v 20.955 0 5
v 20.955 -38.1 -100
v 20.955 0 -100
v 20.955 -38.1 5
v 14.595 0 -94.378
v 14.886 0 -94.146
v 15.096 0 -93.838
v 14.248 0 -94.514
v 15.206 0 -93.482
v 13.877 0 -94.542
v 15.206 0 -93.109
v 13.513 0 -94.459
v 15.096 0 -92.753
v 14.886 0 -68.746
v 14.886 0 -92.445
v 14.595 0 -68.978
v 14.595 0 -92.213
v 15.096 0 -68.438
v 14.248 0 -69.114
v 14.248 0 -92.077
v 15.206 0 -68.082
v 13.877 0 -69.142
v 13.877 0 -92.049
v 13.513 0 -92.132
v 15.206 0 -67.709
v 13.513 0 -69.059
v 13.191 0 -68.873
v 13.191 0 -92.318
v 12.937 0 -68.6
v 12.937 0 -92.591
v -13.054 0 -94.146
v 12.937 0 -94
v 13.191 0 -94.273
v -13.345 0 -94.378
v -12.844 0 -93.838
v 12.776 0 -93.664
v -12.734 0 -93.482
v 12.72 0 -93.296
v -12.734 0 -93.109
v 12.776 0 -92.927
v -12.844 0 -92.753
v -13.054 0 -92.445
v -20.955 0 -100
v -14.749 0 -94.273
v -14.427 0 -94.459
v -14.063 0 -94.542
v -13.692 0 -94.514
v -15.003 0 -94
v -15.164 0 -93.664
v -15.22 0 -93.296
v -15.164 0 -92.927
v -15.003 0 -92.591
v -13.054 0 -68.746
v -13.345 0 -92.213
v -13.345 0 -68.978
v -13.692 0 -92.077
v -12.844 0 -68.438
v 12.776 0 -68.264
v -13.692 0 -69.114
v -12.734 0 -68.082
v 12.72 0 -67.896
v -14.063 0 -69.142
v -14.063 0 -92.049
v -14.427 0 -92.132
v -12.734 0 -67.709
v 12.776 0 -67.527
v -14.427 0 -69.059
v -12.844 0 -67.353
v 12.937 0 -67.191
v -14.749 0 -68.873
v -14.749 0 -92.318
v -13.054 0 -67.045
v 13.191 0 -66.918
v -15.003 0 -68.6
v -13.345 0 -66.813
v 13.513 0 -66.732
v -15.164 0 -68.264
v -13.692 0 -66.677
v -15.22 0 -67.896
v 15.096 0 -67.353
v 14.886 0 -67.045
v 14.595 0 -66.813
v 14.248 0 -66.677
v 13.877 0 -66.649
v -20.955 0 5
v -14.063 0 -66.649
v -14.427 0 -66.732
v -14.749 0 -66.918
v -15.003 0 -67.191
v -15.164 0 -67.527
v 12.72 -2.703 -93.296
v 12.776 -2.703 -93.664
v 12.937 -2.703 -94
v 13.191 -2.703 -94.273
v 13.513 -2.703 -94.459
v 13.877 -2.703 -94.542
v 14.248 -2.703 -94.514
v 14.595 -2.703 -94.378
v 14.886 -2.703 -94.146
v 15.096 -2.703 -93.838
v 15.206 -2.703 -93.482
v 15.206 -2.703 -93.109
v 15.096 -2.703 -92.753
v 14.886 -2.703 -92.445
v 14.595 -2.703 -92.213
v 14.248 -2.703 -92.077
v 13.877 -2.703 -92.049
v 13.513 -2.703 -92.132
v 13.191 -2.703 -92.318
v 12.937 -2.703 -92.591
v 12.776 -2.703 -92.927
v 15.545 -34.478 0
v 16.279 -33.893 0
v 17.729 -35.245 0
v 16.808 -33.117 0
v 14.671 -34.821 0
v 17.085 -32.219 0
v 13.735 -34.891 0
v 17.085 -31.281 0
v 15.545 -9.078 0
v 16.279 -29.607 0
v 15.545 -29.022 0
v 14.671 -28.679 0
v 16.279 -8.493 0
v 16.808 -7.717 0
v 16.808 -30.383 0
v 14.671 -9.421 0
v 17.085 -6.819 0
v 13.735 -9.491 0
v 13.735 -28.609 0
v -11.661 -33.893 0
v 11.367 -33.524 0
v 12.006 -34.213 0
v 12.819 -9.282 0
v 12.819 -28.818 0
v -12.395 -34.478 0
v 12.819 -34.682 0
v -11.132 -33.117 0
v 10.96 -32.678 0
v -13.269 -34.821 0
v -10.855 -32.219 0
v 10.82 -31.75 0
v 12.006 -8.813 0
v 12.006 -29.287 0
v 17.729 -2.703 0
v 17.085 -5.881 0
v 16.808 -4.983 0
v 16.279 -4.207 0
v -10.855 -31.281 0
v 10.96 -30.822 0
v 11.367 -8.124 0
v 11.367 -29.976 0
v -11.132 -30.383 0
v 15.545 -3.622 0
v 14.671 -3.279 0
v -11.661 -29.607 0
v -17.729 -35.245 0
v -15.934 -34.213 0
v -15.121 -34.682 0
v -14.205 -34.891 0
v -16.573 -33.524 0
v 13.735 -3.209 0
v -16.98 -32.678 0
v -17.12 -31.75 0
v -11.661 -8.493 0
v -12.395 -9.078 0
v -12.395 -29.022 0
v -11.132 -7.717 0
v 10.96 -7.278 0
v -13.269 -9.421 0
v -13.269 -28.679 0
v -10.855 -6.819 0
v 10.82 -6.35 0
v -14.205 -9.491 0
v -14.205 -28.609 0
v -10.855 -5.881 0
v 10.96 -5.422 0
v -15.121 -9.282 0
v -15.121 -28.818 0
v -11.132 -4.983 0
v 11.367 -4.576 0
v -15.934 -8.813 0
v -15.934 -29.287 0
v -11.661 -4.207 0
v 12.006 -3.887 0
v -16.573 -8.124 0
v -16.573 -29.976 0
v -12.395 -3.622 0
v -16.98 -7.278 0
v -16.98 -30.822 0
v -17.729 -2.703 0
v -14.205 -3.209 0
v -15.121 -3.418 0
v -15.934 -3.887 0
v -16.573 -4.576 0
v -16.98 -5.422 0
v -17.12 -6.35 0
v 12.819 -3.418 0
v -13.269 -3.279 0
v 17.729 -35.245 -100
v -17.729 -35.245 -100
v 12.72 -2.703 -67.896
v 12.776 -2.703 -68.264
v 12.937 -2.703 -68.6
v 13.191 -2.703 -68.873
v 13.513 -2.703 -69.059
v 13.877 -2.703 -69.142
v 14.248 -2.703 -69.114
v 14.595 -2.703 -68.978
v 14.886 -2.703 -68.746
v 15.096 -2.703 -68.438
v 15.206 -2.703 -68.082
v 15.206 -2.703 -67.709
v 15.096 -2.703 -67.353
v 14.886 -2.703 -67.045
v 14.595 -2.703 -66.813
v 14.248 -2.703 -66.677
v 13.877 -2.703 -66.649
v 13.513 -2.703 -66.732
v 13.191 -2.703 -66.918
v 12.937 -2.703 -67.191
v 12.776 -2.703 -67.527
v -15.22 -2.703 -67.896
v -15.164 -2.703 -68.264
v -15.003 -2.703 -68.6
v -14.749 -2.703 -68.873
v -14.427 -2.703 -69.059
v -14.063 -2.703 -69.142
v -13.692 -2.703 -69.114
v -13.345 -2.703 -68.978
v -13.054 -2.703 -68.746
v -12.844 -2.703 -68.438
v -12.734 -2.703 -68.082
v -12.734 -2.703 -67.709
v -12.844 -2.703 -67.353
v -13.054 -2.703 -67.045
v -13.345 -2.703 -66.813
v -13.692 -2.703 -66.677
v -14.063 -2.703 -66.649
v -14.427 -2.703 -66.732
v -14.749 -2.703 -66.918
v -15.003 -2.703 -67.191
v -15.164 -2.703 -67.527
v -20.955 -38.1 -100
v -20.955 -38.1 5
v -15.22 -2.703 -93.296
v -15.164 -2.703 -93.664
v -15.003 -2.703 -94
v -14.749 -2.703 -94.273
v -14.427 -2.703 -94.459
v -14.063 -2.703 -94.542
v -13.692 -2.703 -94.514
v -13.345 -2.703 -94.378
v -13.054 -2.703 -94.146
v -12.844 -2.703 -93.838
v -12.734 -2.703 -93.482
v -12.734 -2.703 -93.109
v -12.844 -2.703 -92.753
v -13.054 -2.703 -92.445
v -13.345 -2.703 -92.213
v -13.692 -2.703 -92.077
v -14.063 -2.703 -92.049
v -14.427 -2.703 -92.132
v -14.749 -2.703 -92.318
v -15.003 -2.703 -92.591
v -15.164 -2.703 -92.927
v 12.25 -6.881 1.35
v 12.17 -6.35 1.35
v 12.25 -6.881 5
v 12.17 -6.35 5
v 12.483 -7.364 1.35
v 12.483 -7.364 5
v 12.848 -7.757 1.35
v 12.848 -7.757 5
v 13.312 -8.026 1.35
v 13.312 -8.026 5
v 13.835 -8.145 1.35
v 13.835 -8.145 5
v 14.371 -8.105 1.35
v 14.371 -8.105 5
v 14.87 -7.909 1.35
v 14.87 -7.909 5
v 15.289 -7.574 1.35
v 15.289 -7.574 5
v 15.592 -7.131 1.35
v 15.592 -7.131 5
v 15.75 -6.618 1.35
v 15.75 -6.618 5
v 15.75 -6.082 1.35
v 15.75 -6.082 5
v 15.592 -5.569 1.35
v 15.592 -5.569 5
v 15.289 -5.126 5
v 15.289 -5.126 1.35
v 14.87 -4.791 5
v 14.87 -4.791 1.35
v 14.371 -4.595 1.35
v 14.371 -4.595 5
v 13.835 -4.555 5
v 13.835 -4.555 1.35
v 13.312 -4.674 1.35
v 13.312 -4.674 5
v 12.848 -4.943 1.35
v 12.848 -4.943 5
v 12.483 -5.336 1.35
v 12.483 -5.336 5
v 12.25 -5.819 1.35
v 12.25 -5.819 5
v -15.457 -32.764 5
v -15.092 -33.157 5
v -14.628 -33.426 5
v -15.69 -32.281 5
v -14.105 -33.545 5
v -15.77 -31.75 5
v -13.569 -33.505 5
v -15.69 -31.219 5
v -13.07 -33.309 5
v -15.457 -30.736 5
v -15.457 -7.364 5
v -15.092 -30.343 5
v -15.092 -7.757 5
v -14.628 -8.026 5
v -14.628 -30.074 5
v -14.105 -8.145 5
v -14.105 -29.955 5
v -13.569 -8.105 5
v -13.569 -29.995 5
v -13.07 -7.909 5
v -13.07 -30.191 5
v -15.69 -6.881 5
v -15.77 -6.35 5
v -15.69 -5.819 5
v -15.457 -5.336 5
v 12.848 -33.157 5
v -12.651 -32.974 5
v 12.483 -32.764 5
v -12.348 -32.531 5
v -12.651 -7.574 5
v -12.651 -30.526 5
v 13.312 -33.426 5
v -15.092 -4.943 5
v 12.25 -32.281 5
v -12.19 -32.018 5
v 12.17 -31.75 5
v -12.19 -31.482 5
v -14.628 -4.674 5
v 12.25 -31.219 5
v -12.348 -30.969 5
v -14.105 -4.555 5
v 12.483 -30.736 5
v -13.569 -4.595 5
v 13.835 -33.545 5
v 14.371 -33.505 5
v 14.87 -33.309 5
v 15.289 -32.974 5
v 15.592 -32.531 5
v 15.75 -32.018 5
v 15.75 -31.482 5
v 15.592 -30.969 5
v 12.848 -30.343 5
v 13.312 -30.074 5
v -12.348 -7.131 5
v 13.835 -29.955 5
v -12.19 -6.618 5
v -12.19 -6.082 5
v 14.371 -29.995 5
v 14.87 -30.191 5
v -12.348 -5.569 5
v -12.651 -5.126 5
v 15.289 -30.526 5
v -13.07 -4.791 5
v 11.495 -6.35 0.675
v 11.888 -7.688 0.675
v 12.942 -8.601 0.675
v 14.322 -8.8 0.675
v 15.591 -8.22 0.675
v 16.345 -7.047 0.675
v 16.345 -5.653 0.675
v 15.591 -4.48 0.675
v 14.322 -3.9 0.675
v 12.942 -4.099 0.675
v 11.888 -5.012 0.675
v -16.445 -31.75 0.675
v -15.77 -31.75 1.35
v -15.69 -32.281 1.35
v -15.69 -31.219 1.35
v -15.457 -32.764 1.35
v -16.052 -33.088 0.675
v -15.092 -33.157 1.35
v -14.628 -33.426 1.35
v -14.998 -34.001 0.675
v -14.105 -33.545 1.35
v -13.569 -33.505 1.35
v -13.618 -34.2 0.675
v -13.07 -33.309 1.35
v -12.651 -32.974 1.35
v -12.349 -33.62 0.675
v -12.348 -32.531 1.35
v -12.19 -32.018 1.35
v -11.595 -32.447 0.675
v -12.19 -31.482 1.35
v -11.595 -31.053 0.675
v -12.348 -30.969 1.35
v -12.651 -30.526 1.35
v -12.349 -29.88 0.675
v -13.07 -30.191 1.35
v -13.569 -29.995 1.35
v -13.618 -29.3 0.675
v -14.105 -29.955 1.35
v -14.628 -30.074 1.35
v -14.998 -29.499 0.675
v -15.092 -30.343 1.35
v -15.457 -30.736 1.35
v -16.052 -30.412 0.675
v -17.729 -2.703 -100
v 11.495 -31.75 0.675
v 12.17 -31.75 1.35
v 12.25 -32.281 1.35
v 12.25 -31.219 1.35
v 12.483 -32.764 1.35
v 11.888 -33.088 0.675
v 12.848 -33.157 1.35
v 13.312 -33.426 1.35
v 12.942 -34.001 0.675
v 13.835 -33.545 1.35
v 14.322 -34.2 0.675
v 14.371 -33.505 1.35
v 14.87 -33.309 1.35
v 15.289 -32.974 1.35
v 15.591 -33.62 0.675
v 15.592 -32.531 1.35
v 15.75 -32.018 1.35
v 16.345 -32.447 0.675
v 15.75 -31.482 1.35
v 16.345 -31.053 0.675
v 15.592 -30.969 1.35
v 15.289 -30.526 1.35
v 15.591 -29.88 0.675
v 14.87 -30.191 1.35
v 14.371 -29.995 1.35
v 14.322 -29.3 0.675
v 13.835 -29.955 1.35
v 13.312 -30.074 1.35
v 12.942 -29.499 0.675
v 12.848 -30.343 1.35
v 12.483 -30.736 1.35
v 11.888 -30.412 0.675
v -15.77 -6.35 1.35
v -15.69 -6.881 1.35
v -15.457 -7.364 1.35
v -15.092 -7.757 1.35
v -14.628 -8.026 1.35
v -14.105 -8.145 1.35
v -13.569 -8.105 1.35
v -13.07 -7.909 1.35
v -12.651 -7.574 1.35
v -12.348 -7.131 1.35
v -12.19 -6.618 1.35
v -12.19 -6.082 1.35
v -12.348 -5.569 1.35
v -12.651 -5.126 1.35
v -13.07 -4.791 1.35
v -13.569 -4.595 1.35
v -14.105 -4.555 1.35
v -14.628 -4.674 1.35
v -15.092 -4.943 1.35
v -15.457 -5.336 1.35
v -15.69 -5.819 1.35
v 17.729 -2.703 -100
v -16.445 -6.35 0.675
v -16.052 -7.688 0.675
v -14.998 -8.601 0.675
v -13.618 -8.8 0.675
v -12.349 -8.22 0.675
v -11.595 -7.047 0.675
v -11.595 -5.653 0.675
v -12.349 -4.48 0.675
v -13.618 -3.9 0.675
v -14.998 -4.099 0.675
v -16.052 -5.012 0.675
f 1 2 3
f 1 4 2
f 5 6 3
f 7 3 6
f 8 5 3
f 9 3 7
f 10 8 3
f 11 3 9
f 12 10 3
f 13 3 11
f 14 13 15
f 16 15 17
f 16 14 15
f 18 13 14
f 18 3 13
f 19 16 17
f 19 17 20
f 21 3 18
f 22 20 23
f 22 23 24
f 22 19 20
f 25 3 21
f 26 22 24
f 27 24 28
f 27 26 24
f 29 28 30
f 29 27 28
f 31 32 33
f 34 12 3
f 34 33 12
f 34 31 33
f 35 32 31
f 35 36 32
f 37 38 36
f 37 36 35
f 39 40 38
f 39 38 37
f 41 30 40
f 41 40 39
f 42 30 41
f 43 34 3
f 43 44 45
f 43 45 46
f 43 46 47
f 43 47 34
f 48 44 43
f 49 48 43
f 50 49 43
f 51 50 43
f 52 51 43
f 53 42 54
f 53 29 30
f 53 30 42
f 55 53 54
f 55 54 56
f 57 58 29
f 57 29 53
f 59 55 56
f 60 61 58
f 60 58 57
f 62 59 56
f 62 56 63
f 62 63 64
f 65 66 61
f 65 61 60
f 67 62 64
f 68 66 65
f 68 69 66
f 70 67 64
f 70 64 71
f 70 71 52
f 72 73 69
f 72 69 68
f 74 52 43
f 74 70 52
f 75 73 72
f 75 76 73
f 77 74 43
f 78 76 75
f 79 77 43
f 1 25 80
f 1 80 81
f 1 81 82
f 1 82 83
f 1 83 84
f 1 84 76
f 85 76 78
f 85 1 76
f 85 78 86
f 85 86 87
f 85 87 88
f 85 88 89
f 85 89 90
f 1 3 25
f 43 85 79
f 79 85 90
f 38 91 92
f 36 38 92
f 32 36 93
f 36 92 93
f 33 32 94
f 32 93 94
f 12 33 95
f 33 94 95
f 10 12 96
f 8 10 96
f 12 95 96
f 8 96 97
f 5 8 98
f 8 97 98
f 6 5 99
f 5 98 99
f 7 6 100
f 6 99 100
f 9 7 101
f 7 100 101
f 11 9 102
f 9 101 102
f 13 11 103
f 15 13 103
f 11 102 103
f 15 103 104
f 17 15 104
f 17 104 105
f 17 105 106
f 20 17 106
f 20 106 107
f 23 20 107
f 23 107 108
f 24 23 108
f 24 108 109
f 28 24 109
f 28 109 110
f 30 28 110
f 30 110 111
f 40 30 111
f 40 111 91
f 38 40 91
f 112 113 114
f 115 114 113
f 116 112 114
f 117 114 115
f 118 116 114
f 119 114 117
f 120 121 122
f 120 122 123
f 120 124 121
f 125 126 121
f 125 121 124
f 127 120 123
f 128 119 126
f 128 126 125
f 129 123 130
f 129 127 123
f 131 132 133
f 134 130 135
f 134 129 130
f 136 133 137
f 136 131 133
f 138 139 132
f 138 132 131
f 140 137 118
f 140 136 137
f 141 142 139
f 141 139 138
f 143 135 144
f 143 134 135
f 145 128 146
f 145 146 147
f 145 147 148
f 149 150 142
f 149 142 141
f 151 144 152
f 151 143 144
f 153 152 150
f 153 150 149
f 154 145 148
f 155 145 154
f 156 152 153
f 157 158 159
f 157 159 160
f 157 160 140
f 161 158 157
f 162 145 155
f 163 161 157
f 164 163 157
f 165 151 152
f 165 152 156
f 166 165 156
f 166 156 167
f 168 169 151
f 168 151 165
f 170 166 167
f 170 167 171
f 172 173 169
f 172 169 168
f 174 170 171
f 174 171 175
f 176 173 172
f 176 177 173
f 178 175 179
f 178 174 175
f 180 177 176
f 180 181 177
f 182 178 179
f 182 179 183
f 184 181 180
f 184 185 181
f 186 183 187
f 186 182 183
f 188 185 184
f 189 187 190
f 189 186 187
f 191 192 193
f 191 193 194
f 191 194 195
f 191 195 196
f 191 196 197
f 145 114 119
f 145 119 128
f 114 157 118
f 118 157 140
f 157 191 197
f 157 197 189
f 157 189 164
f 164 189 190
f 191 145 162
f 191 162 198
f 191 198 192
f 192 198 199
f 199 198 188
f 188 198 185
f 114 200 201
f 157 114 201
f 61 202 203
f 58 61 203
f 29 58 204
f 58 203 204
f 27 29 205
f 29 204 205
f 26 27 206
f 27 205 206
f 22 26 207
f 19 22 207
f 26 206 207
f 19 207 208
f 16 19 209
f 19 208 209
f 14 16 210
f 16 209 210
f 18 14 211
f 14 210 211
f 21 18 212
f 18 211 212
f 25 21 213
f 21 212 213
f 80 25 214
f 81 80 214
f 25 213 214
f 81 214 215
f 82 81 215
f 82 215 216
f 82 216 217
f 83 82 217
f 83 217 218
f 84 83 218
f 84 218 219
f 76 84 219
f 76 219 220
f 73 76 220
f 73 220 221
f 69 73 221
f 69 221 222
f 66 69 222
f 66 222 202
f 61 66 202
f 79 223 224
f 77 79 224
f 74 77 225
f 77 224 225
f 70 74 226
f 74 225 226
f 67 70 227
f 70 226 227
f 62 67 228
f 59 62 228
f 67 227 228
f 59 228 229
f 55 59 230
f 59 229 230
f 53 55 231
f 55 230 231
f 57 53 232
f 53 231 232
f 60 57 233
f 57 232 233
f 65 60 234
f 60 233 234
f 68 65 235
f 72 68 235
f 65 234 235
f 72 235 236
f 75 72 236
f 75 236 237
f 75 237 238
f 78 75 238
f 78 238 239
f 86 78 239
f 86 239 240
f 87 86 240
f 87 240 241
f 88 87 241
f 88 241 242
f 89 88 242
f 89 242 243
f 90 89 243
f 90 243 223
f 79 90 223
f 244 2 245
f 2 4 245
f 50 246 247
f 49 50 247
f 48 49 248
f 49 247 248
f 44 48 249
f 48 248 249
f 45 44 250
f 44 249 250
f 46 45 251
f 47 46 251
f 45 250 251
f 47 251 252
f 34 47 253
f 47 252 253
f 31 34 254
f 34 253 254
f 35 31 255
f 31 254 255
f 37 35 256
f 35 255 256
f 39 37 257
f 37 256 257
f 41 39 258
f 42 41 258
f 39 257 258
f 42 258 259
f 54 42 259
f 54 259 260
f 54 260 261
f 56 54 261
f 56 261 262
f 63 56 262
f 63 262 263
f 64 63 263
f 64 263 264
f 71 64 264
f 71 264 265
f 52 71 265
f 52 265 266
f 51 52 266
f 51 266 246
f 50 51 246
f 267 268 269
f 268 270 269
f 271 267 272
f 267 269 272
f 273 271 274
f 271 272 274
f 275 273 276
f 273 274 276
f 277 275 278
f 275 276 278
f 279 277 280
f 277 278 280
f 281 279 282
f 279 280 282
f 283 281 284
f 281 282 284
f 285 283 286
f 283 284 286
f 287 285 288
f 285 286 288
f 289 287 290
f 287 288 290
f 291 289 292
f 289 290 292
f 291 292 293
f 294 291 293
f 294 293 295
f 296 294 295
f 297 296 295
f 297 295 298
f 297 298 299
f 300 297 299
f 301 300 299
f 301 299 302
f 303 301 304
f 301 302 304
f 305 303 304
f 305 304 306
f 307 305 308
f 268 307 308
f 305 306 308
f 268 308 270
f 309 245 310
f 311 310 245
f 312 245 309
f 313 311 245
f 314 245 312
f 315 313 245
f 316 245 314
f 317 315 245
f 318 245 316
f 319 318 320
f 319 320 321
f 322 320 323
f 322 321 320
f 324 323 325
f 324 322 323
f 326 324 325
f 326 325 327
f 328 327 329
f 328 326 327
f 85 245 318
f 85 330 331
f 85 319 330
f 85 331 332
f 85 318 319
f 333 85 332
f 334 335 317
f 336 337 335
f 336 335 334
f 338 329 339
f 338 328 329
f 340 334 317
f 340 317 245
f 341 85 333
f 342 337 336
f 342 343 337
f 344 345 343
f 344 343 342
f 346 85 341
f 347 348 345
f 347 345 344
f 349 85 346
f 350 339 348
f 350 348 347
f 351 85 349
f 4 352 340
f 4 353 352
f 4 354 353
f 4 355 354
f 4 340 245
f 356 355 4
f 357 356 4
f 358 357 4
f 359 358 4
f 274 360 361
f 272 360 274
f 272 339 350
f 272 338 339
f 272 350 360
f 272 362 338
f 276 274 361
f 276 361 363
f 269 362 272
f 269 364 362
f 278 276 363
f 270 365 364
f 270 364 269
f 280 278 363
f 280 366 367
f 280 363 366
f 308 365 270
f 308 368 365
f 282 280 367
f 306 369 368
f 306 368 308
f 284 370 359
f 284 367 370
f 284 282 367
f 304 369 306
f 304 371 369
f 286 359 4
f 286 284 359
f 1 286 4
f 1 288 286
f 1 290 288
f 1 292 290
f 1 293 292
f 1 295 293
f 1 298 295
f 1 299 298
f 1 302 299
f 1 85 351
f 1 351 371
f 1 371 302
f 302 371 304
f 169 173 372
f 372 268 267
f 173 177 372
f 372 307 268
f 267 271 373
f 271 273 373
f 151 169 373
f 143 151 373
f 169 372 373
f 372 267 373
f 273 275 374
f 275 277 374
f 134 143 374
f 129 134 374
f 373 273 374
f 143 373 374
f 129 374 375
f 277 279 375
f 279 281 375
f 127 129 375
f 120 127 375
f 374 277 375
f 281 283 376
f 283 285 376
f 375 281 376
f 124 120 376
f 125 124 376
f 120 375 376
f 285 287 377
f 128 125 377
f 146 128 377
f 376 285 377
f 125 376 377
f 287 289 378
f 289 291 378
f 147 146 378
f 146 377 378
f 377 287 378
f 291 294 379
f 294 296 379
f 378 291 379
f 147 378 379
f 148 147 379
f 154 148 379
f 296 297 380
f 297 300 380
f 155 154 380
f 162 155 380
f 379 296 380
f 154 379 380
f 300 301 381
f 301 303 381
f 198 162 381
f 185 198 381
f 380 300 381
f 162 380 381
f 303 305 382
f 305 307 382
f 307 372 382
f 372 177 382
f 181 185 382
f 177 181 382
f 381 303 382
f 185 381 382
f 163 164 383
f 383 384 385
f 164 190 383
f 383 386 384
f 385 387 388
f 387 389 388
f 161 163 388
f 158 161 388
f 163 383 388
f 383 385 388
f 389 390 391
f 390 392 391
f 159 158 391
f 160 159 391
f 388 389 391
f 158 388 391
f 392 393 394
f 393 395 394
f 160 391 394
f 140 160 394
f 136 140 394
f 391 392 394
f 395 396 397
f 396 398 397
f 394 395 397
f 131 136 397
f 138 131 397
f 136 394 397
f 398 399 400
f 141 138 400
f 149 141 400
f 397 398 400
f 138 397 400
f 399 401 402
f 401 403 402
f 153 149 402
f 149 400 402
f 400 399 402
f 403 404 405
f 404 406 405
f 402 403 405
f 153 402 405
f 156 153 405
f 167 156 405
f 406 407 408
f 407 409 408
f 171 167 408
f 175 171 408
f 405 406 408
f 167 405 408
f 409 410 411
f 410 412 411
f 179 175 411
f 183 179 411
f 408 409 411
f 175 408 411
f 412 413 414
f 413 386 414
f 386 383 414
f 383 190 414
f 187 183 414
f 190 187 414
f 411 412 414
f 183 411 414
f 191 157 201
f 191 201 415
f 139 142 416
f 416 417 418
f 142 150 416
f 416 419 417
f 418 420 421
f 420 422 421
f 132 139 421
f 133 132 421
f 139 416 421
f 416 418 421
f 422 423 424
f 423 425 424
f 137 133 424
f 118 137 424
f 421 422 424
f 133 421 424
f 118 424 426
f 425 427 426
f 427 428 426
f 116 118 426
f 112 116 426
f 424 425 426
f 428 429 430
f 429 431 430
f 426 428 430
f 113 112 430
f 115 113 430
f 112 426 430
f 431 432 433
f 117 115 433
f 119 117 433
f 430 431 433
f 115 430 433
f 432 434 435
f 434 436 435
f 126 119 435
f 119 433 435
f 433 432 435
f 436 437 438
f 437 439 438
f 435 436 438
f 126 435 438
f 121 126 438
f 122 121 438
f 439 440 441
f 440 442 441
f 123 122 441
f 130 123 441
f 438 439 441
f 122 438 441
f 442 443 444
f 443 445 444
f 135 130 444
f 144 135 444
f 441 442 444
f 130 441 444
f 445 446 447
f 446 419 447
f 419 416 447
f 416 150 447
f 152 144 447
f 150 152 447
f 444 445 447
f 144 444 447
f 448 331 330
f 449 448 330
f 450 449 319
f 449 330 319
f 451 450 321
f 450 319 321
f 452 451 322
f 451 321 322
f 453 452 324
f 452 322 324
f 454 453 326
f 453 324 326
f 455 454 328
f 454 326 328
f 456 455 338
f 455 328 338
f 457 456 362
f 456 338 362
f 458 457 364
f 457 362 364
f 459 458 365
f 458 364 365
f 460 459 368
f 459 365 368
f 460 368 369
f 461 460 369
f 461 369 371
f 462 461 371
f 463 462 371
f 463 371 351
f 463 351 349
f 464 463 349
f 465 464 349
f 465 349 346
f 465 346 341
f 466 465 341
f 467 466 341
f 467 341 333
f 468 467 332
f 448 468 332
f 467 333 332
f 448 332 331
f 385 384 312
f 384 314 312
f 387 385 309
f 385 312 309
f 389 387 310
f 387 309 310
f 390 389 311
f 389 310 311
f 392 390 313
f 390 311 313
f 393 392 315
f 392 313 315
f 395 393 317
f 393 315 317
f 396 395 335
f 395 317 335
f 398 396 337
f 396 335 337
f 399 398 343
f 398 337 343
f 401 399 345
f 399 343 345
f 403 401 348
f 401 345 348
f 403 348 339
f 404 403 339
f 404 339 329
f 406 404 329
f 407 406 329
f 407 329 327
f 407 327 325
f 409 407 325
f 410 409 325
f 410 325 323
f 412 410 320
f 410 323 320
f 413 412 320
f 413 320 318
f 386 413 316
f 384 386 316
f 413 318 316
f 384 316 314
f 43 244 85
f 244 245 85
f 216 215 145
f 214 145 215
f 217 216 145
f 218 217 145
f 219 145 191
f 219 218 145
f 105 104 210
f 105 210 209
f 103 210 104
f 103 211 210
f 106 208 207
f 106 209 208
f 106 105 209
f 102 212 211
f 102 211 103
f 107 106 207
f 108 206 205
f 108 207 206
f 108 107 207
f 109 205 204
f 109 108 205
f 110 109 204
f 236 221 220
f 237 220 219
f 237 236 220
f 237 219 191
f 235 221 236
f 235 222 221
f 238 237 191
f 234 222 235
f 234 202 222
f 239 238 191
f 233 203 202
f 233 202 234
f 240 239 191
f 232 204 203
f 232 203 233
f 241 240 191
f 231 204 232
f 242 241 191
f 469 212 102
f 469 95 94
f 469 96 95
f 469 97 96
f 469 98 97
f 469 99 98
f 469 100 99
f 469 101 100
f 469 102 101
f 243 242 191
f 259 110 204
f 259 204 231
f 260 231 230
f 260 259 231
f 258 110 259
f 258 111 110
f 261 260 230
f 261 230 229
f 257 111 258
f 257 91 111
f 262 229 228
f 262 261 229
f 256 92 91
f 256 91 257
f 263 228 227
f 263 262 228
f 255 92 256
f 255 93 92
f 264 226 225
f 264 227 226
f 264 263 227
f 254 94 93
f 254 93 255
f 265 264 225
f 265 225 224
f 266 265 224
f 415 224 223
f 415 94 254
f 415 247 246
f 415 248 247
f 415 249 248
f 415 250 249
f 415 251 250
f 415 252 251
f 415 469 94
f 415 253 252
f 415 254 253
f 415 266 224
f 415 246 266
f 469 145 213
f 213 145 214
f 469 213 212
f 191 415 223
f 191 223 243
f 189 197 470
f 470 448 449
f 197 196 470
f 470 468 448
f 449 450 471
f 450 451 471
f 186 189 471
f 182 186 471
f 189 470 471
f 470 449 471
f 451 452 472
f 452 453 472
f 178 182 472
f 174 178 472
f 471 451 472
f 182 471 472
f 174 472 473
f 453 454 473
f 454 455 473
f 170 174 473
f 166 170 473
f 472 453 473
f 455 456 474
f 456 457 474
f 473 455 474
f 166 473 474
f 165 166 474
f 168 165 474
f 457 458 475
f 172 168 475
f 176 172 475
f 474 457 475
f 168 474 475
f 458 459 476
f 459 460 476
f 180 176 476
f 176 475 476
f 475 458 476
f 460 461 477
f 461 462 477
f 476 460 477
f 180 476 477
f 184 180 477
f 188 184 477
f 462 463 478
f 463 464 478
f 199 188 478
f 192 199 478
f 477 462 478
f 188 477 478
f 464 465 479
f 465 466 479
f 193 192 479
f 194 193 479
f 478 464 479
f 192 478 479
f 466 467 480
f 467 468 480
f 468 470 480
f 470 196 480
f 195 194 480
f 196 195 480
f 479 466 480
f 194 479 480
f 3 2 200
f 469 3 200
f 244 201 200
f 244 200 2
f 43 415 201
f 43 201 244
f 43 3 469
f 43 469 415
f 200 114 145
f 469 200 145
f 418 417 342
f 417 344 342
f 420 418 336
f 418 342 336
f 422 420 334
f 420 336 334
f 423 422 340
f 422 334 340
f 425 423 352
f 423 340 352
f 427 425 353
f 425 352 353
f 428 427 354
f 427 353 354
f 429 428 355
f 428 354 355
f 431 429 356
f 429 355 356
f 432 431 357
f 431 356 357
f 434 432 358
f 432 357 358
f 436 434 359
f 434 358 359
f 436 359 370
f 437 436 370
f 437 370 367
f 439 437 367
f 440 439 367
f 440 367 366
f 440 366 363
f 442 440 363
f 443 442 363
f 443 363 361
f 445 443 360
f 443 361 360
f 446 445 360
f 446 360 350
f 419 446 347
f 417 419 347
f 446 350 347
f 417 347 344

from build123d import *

# Parameters (mm, degrees)
SKETCH3_W                                           = 20.955
SKETCH3_H                                           = 38.1
BOSS_EXTRUDE1_DEPTH                                 = 5
CSK_FOR_M3_COUNTERSUNK_FLAT_HEAD_SCREW1_D           = 3.6
CSK_FOR_M3_COUNTERSUNK_FLAT_HEAD_SCREW1_DEPTH       = 10
CSK_FOR_M3_COUNTERSUNK_FLAT_HEAD_SCREW1_CSINK_D     = 6.3
CSK_FOR_M3_COUNTERSUNK_FLAT_HEAD_SCREW1_CSINK_ANGLE = 90
CSK_FOR_M3_COUNTERSUNK_FLAT_HEAD_SCREW1_TIP         = 1.081549114
CSK_FOR_M3_COUNTERSUNK_FLAT_HEAD_SCREW2_D           = 3.6
CSK_FOR_M3_COUNTERSUNK_FLAT_HEAD_SCREW2_DEPTH       = 10
CSK_FOR_M3_COUNTERSUNK_FLAT_HEAD_SCREW2_CSINK_D     = 6.3
CSK_FOR_M3_COUNTERSUNK_FLAT_HEAD_SCREW2_CSINK_ANGLE = 90
CSK_FOR_M3_COUNTERSUNK_FLAT_HEAD_SCREW2_TIP         = 1.081549114
SKETCH12_W                                          = 41.91
SKETCH12_H                                          = 38.1
BOSS_EXTRUDE2_DEPTH                                 = 100
SKETCH15_W                                          = 35.458687416
SKETCH15_H                                          = 32.541680012
CUT_EXTRUDE4_DEPTH                                  = 100
M3_TAPPED_HOLE1_D                                   = 2.5
M3_TAPPED_HOLE1_DEPTH                               = 10
M3_TAPPED_HOLE1_TIP                                 = 0.751075774


with BuildPart() as part:
    # Sketch3 → Boss-Extrude1 (new body)
    with BuildSketch(Plane.XY):
        with Locations((10.4775, -19.05)):
            Rectangle(SKETCH3_W, SKETCH3_H)
        with Locations((-10.4775, -19.05)):
            Rectangle(SKETCH3_W, SKETCH3_H)
    extrude(amount=BOSS_EXTRUDE1_DEPTH)

    # CSK for M3 Countersunk Flat Head Screw1
    with Locations(Plane(origin=(0, 0, 0), x_dir=(1, 0, 0), z_dir=(0, 0, -1))):
        with Locations((-13.97, 6.35)):
            CounterSinkHole(CSK_FOR_M3_COUNTERSUNK_FLAT_HEAD_SCREW1_D / 2, CSK_FOR_M3_COUNTERSUNK_FLAT_HEAD_SCREW1_CSINK_D / 2, depth=CSK_FOR_M3_COUNTERSUNK_FLAT_HEAD_SCREW1_DEPTH, counter_sink_angle=CSK_FOR_M3_COUNTERSUNK_FLAT_HEAD_SCREW1_CSINK_ANGLE)
            with Locations((0, 0, -(CSK_FOR_M3_COUNTERSUNK_FLAT_HEAD_SCREW1_DEPTH + CSK_FOR_M3_COUNTERSUNK_FLAT_HEAD_SCREW1_TIP / 2))):  # 118° drill point
                Cone(0, CSK_FOR_M3_COUNTERSUNK_FLAT_HEAD_SCREW1_D / 2, CSK_FOR_M3_COUNTERSUNK_FLAT_HEAD_SCREW1_TIP, mode=Mode.SUBTRACT)

    # CSK for M3 Countersunk Flat Head Screw2
    with Locations(Plane(origin=(0, 0, 0), x_dir=(1, 0, 0), z_dir=(0, 0, -1))):
        with Locations((-13.97, 31.75), (-13.97, 6.35), (13.97, 6.35), (13.97, 31.75)):
            CounterSinkHole(CSK_FOR_M3_COUNTERSUNK_FLAT_HEAD_SCREW2_D / 2, CSK_FOR_M3_COUNTERSUNK_FLAT_HEAD_SCREW2_CSINK_D / 2, depth=CSK_FOR_M3_COUNTERSUNK_FLAT_HEAD_SCREW2_DEPTH, counter_sink_angle=CSK_FOR_M3_COUNTERSUNK_FLAT_HEAD_SCREW2_CSINK_ANGLE)
            with Locations((0, 0, -(CSK_FOR_M3_COUNTERSUNK_FLAT_HEAD_SCREW2_DEPTH + CSK_FOR_M3_COUNTERSUNK_FLAT_HEAD_SCREW2_TIP / 2))):  # 118° drill point
                Cone(0, CSK_FOR_M3_COUNTERSUNK_FLAT_HEAD_SCREW2_D / 2, CSK_FOR_M3_COUNTERSUNK_FLAT_HEAD_SCREW2_TIP, mode=Mode.SUBTRACT)

    # Sketch12 → Boss-Extrude2 (add)
    with BuildSketch(Plane(origin=(0, 0, 0), x_dir=(-1, 0, 0), z_dir=(0, 0, -1))):
        with Locations((0, -19.05)):
            Rectangle(SKETCH12_W, SKETCH12_H)
    extrude(amount=BOSS_EXTRUDE2_DEPTH)

    # Sketch15 → Cut-Extrude4 (cut)
    with BuildSketch(Plane(origin=(0, 0, -100), x_dir=(-1, 0, 0), z_dir=(0, 0, -1))):
        with Locations((0, -18.974233574)):
            Rectangle(SKETCH15_W, SKETCH15_H)
    extrude(amount=-CUT_EXTRUDE4_DEPTH, mode=Mode.SUBTRACT)

    # M3 Tapped Hole1
    with Locations(Plane(origin=(0, 0, 0), x_dir=(1, 0, 0), z_dir=(0, 1, 0))):
        with Locations((-13.97, 93.295610143), (-13.97, 67.895610143), (13.97, 67.895610143), (13.97, 93.295610143)):
            Hole(M3_TAPPED_HOLE1_D / 2, depth=M3_TAPPED_HOLE1_DEPTH)
            with Locations((0, 0, -(M3_TAPPED_HOLE1_DEPTH + M3_TAPPED_HOLE1_TIP / 2))):  # 118° drill point
                Cone(0, M3_TAPPED_HOLE1_D / 2, M3_TAPPED_HOLE1_TIP, mode=Mode.SUBTRACT)


solid = part.part
